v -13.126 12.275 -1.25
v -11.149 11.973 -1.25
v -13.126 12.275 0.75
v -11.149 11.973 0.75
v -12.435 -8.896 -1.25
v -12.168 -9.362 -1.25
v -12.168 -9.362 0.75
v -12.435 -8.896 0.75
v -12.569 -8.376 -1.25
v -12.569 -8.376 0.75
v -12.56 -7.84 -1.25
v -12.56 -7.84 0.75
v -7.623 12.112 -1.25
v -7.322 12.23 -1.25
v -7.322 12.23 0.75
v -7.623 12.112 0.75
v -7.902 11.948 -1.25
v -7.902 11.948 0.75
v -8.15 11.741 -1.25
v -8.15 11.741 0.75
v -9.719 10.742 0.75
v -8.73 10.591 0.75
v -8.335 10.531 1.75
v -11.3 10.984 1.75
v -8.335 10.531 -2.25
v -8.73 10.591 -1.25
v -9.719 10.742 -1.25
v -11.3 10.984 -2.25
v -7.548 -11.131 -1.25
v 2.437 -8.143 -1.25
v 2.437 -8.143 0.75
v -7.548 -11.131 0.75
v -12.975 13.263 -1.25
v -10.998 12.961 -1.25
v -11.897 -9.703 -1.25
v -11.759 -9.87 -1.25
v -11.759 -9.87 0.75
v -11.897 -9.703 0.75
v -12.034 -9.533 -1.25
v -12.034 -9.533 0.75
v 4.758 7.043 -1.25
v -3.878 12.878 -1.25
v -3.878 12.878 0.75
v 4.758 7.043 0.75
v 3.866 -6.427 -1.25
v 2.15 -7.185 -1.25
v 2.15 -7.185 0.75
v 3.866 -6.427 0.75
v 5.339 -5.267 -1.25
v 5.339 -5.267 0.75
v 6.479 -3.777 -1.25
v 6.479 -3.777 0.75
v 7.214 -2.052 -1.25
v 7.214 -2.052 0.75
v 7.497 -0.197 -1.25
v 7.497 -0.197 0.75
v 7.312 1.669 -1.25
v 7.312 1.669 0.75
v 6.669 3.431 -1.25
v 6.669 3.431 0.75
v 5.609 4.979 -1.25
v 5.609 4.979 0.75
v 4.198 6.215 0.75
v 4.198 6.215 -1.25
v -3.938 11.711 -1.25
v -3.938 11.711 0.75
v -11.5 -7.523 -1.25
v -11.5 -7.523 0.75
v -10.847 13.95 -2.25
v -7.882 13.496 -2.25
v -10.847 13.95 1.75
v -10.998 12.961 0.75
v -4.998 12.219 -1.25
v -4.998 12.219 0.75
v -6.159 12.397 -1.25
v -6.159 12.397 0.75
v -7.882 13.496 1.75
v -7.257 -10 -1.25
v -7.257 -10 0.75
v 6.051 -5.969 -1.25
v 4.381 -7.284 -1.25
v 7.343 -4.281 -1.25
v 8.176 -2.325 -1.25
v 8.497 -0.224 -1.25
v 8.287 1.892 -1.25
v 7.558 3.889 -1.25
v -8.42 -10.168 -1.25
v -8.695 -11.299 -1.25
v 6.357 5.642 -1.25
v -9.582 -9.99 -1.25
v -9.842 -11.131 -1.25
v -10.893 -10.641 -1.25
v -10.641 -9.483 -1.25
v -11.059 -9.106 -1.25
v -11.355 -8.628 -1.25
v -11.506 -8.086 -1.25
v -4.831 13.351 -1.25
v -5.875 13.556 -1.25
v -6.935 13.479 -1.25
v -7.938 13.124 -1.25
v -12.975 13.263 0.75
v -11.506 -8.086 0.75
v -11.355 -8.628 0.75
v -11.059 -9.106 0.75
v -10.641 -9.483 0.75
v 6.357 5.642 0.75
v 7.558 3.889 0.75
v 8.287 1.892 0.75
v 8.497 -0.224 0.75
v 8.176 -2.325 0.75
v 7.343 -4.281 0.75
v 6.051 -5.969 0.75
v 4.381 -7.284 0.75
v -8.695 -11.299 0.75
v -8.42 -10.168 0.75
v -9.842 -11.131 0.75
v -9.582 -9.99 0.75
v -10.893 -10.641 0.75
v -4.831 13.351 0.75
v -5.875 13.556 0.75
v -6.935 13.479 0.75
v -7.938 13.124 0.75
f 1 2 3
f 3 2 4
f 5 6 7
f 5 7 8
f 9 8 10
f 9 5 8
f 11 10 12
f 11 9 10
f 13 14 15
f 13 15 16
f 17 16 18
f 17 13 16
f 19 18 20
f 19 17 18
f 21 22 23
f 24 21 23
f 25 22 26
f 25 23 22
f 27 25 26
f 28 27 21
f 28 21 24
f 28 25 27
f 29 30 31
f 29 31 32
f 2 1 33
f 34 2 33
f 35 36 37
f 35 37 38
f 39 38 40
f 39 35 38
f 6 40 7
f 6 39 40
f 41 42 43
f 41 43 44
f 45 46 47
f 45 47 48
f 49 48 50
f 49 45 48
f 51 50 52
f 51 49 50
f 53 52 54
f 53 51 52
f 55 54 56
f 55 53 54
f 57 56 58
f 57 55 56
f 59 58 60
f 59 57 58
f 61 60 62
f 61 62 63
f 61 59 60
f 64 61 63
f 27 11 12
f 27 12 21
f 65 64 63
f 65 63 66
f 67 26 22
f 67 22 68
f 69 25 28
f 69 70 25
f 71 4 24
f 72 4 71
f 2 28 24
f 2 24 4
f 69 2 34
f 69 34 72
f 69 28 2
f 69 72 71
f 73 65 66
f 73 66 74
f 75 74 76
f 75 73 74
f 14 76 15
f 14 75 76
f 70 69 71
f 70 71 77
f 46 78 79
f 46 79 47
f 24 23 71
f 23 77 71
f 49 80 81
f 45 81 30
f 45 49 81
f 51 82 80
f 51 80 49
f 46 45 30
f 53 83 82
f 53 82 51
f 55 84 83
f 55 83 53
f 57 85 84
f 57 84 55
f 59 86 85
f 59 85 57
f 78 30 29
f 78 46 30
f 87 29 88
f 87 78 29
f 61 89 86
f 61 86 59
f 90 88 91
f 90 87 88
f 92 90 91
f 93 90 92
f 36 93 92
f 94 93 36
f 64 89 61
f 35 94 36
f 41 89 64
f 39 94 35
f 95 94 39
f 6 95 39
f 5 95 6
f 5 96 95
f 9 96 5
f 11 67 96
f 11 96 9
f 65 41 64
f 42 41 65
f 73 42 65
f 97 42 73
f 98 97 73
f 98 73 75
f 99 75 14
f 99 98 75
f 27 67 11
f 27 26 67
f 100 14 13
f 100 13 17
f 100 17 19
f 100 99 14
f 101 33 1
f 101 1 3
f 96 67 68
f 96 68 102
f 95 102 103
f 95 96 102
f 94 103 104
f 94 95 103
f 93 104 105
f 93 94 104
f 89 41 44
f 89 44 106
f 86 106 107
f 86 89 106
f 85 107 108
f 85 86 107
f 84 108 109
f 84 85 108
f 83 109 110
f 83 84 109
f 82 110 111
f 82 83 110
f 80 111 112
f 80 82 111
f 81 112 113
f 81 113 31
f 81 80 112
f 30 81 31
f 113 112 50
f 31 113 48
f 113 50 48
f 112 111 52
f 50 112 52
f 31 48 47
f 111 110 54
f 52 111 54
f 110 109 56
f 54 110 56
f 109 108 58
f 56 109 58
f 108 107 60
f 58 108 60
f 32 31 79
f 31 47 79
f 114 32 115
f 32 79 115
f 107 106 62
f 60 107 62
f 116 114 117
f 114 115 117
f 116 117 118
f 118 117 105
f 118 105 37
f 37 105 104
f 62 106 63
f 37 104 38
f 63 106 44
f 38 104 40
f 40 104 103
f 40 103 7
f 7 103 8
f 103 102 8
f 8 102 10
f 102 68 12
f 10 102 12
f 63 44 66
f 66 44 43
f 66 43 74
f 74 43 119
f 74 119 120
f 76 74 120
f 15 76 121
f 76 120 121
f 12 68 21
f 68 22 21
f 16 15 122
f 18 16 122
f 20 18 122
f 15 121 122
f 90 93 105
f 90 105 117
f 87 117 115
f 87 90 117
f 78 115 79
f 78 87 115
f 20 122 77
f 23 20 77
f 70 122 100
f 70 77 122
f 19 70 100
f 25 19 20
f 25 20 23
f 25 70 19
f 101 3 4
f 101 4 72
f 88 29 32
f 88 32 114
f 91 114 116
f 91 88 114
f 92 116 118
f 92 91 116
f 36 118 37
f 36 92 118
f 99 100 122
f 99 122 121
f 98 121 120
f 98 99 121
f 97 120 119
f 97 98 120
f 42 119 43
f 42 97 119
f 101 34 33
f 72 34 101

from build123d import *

# Parameters (mm, degrees)
BOSS_EXTRUDE1_START      = -1.25
BOSS_EXTRUDE1_DEPTH      = 2
BOSS_EXTRUDE2_DEPTH      = 1
BOSS_EXTRUDE2_DEPTH_BACK = 3
SKETCH3_W                = 2
SKETCH3_H                = 1
BOSS_EXTRUDE3_DEPTH      = 2


with BuildPart() as part:
    # Sketch1 → Boss-Extrude1 (new body)
    with BuildSketch(Plane.XY.offset(BOSS_EXTRUDE1_START)):
        with BuildLine():
            Line((2.436539132, -8.143296449), (-7.548366257, -11.130859638))
            ThreePointArc((-7.548366257, -11.130859638), (-9.842130636, -11.130694708), (-11.758669759, -9.870443602))
            ThreePointArc((-11.758669759, -9.870443602), (-11.965894787, -9.618177235), (-12.167708806, -9.361561504))
            ThreePointArc((-12.167708806, -9.361561504), (-12.519382992, -8.640760337), (-12.559604102, -7.839753896))
            Line((-12.559604102, -7.839753896), (-9.643676177, 11.234095698))
            ThreePointArc((-9.643676177, 11.234095698), (-9.365976364, 11.986499758), (-8.815011776, 12.569309399))
            ThreePointArc((-8.815011776, 12.569309399), (-8.54574672, 12.753908592), (-8.272617255, 12.932740434))
            ThreePointArc((-8.272617255, 12.932740434), (-6.067091304, 13.562827996), (-3.87804418, 12.877680022))
            Line((-3.87804418, 12.877680022), (4.758214838, 7.043393469))
            ThreePointArc((4.758214838, 7.043393469), (8.402381141, -1.284519818), (2.436539132, -8.143296449))
        make_face()
        with BuildLine():
            Line((-7.257137668, -9.99991839), (2.149887469, -7.185261573))
            ThreePointArc((2.149887469, -7.185261573), (7.413865713, -1.133399839), (4.198424857, 6.214758943))
            Line((4.198424857, 6.214758943), (-3.938007339, 11.711383912))
            ThreePointArc((-3.938007339, 11.711383912), (-5.571798261, 12.3507715), (-7.322050422, 12.229500574))
            ThreePointArc((-7.322050422, 12.229500574), (-8.258340754, 11.626081421), (-8.726639699, 10.615413149))
            Line((-8.726639699, 10.615413149), (-11.499609723, -7.523311304))
            ThreePointArc((-11.499609723, -7.523311304), (-11.354656305, -8.627730955), (-10.641413415, -9.483323638))
            ThreePointArc((-10.641413415, -9.483323638), (-9.007335115, -10.12197642), (-7.257137668, -9.99991839))
        make_face(mode=Mode.SUBTRACT)
    extrude(amount=BOSS_EXTRUDE1_DEPTH)

    # Sketch2 → Boss-Extrude2 (add, two sides: drawn at the far end of the back side and taken through both)
    with BuildSketch(Plane.XY.offset(0.75).offset(-BOSS_EXTRUDE2_DEPTH_BACK)):
        Polygon((-8.334933677, 10.530761514), (-11.300479962, 10.98412145), (-10.847120026, 13.949667735), (-7.881573741, 13.4963078), align=None)
    extrude(amount=BOSS_EXTRUDE2_DEPTH + BOSS_EXTRUDE2_DEPTH_BACK)

    # Sketch3 → Boss-Extrude3 (add)
    with BuildSketch(Plane(origin=(-12.683264825, 1.938962867, 0), x_dir=(0, 0, 1), z_dir=(-0.9885154283423572, 0.15111997859027873, 0))):
        with Locations((-0.25, 10.65024523)):
            Rectangle(SKETCH3_W, SKETCH3_H)
    extrude(amount=BOSS_EXTRUDE3_DEPTH)


solid = part.part
